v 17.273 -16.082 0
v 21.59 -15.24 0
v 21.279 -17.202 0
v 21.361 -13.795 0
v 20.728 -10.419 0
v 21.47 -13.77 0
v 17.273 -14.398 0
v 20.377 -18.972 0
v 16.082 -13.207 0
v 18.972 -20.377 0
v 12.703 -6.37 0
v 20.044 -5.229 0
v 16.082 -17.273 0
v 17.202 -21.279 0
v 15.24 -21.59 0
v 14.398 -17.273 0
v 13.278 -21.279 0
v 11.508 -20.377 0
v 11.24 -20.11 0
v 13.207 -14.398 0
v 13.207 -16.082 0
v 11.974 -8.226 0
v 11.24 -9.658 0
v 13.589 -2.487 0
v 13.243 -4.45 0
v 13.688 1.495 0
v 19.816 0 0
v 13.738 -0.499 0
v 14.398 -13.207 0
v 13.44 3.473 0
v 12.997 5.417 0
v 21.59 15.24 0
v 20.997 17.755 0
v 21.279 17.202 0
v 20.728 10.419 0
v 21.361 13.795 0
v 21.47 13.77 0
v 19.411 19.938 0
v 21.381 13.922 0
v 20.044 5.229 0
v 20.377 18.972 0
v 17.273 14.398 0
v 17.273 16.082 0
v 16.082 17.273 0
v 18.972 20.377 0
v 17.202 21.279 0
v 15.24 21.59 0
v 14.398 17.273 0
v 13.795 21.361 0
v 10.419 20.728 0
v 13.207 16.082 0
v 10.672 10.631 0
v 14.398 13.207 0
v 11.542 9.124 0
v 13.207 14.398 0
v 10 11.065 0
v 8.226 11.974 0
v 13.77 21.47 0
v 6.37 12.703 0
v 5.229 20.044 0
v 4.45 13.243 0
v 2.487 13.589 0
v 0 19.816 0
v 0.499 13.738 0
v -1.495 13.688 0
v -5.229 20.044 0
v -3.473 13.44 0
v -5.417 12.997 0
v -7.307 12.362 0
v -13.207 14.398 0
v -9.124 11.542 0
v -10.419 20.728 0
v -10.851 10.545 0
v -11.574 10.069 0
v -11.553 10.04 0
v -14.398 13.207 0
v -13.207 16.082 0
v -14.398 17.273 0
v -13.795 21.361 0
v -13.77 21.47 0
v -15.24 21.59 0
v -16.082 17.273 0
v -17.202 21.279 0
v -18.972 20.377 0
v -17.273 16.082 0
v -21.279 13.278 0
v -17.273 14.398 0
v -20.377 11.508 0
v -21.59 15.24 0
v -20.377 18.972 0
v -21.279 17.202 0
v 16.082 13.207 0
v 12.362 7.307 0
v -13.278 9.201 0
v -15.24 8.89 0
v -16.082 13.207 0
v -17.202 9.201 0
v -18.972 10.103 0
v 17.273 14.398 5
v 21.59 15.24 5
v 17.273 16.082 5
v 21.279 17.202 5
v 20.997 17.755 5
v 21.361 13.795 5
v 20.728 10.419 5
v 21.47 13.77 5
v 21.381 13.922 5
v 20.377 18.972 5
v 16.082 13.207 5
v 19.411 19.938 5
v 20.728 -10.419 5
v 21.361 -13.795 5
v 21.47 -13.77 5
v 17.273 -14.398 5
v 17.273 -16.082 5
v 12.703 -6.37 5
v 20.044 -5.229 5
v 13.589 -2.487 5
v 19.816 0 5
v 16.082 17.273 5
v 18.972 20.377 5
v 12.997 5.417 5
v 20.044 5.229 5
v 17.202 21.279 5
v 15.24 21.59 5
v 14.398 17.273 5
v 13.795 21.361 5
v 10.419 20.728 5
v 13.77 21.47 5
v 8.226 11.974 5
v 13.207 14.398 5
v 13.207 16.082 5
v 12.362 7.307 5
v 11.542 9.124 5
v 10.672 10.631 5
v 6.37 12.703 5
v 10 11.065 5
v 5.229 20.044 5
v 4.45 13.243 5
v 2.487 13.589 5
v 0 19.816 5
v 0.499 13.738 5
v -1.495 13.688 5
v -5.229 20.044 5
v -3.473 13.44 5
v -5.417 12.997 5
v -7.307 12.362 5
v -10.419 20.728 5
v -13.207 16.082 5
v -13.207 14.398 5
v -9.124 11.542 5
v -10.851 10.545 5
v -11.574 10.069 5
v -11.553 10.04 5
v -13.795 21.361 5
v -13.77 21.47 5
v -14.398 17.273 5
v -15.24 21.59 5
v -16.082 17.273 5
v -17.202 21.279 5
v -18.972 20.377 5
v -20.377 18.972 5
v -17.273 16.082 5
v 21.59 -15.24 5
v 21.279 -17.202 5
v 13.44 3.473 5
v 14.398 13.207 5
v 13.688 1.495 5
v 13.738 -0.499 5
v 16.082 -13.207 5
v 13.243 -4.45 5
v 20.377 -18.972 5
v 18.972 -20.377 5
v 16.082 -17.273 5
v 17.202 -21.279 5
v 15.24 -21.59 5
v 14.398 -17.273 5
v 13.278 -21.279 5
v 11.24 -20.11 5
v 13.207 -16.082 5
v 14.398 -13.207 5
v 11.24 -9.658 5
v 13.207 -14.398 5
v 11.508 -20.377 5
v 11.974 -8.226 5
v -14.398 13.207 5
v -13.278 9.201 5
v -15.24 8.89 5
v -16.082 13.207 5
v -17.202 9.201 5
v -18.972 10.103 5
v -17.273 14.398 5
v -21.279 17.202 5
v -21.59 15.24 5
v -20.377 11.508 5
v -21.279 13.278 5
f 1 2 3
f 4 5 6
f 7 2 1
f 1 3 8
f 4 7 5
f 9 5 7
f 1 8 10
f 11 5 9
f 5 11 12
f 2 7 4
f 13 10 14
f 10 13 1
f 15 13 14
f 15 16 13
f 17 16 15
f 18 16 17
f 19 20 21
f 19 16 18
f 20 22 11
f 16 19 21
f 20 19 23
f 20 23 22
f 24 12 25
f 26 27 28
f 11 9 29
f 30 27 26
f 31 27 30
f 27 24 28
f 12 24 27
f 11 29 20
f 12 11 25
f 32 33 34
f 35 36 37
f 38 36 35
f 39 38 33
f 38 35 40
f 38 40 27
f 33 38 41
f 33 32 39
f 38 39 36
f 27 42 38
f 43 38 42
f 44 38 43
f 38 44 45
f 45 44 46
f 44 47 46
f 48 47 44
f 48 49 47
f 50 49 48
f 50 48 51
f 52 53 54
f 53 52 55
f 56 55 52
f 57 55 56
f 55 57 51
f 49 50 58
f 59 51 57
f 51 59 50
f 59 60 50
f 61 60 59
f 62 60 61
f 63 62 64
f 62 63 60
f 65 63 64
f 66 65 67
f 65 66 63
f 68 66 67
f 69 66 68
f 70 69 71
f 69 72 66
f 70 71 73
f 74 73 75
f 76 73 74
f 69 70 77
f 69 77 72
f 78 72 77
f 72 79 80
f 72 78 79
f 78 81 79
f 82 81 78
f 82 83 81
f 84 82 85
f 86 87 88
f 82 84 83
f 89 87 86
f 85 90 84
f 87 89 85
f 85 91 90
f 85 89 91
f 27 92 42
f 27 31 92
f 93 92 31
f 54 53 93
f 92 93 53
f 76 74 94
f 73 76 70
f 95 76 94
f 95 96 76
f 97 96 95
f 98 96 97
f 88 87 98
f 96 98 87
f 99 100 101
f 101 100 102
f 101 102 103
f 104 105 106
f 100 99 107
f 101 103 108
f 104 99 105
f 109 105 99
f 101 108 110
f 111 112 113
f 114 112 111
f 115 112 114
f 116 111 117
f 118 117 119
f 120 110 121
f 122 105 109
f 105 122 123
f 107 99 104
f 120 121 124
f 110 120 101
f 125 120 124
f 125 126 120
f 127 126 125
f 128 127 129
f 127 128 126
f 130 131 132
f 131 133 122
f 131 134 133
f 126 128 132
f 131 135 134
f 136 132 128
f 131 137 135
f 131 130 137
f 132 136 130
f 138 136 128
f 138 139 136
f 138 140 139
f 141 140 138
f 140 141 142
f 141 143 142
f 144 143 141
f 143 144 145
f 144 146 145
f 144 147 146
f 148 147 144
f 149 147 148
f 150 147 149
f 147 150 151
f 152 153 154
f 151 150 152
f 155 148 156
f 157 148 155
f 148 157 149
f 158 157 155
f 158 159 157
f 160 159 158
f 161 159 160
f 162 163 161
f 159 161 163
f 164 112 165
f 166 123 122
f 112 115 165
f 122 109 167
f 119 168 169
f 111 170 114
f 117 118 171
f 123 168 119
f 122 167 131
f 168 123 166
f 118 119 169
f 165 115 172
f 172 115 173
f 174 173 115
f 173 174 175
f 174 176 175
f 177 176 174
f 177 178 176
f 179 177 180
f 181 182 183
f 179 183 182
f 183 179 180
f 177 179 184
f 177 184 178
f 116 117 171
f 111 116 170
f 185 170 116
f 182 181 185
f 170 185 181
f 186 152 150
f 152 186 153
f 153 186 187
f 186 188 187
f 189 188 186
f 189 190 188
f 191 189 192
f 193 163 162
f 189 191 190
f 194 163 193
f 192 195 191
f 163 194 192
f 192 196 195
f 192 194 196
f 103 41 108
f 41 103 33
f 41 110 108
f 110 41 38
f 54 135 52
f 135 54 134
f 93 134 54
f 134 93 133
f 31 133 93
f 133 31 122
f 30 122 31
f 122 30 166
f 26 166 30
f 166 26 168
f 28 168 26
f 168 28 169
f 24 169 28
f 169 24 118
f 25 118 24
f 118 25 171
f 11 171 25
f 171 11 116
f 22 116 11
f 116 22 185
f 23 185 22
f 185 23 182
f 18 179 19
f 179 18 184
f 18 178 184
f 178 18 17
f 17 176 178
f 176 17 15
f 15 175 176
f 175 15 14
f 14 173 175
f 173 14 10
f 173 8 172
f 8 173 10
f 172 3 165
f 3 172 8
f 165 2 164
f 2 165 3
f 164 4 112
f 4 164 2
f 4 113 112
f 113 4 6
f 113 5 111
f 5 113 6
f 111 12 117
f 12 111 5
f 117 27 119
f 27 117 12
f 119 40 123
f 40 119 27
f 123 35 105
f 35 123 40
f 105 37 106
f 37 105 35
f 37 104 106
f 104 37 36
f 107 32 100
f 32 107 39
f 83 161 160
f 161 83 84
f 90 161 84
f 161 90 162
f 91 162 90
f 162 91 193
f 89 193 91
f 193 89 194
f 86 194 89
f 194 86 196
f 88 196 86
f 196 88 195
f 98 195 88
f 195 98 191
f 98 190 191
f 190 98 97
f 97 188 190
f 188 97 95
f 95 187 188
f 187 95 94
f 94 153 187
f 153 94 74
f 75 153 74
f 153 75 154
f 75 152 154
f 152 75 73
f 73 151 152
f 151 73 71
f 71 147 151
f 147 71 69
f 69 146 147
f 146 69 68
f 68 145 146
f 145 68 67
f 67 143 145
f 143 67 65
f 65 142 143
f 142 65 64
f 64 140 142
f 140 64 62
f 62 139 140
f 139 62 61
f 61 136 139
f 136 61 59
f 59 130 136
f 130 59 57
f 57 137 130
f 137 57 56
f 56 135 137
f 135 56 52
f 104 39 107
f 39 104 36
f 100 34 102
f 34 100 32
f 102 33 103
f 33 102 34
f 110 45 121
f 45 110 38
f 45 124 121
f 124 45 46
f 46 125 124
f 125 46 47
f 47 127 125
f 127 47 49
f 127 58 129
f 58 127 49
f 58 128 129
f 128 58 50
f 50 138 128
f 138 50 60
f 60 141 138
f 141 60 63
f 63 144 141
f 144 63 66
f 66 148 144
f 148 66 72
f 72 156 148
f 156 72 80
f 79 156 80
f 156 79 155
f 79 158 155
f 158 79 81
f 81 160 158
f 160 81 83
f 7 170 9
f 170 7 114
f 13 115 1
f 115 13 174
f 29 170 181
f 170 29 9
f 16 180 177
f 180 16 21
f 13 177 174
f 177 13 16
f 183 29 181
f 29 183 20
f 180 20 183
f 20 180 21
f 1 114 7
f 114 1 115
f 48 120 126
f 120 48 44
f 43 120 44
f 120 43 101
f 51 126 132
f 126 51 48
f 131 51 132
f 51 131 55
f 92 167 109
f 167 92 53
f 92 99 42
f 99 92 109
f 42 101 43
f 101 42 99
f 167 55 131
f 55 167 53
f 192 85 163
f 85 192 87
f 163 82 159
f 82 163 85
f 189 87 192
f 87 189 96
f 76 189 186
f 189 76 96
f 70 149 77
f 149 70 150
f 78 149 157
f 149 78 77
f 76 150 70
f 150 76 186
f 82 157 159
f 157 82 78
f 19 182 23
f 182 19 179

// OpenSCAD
// file: functions.scad
// PRUSA Mendel  
// Functions used in many files
// GNU GPL v2
// Josef Průša
// josefprusa@me.com
// prusadjs.cz
// http://www.reprap.org/wiki/Prusa_Mendel
// http://github.com/prusajr/PrusaMendel

module nut( d, h, horizontal = true )
{
	cornerdiameter = ( d / 2 ) / cos( 180 / 6 );
	cylinder( h = h, r = cornerdiameter, $fn = 6 );
	if( horizontal )
	{
		for( i = [1 : 6] )
		{
			rotate( [0, 0, 60 * i] ) translate( [-cornerdiameter - 0.2, 0, 0] ) rotate( [0, 0, -45] ) cube( size = [2, 2, h] );
		}
	}
}

// By nophead
module polyhole( d, h ) 
{
	n = max( round( 2 * d ), 3 );
	rotate( [0, 0, 180] ) cylinder( h = h, r = ( d / 2 ) / cos( 180 / n ), $fn = n );
}

module roundcorner( diameter )
{
	difference()
	{
		cube( size = [diameter, diameter, 99], center = false );
		translate( v = [diameter, diameter, 0] ) cylinder( h = 100, r = diameter, center = true );
	}
}
// file: metric.scad
// PRUSA Mendel  
// Default metric sizes
// GNU GPL v2
// Josef Průša
// josefprusa@me.com
// prusadjs.cz
// http://www.reprap.org/wiki/Prusa_Mendel
// http://github.com/prusajr/PrusaMendel

// DONT CHANGE THIS FILE! ALTER VALUES IN CONFIGURATION.SCAD INSTEAD

// RODS

threaded_rod_diameter = 8.2;
threaded_rod_diameter_horizontal = 8.2;
smooth_bar_diameter = 8;
smooth_bar_diameter_horizontal = 8.5;

// Nuts and bolts

m8_diameter = 9;
m8_nut_diameter = 16.4;

m4_diameter = 4.5;
m4_nut_diameter = 9;

m3_diameter = 3.6;
m3_nut_diameter = 6.1;

// Bushing holder

bushing_core_diameter = smooth_bar_diameter;
bushing_material_thickness = 1;

// Motors

motor_shaft = 5.5;
// file: configuration.scad
// PRUSA Mendel  
// Configuration file
// GNU GPL v2
// Josef Průša
// josefprusa@me.com
// prusadjs.cz
// http://www.reprap.org/wiki/Prusa_Mendel
// http://github.com/prusajr/PrusaMendel

// PLEASE SELECT ONE OF THE CONFIGURATIONS BELOW
// BY UN-COMMENTING IT

// Uncomment for metric settings
// METRIC METRIC METRIC METRIC METRIC METRIC METRIC METRIC 

include <metric.scad>;

// Uncomment for imperial settings
// IMPERIAL IMPERIAL IMPERIAL IMPERIAL IMPERIAL IMPERIAL IMPERIAL 

//include <sae.scad>;

// CUSTOM CUSTOM CUSTOM CUSTOM CUSTOM CUSTOM CUSTOM CUSTOM CUSTOM

// Thin walls
layer_height = 0.3;
wot = 1.5;
filament_width = layer_height * wot;

thin_wall = 4 * layer_height * wot;

// LM8UU
linear = true;
linear_bearing_diameter = 15;
linear_bearing_length = 24;

//608 bearing
bearing_diameter = 22;
bearing_thickness = 7;

//Timing belt
belt_pitch = 5;

// CHANGE ONLY THE STUFF YOU KNOW
// IT WILL REPLACE DEFAULT SETTING

// RODS

// threaded_rod_diameter = 0;
// threaded_rod_diameter_horizontal = 0;
// smooth_bar_díameter = 0;
// smooth_bar_díameter_horizontal = 0;

// Nuts and bolts

// m8_diameter = 0;
// m8_nut_diameter = 0;
// m8_nut_thickness = 0;

// m4_diameter = 0;
 m4_nut_diameter = 8.5;
// m4_nut_thickness = 0;

// m3_diameter = 0;
// m3_nut_diameter = 0;
m3_nut_thickness = 3;

// Bushing holder

// bushing_core_diameter = smooth_bar_díameter;
// bushing_material_thickness = 0;

///counted stuff
m3_nut_diameter_bigger = ( ( m3_nut_diameter  / 2) / cos( 180 / 6 ) ) * 2;

// functions 
include <functions.scad>
// main file
// PRUSA Mendel  
// X-end with NEMA 17 motor mount
// GNU GPL v2
// Josef Průša
// josefprusa@me.com
// prusadjs.cz
// http://www.reprap.org/wiki/Prusa_Mendel
// http://github.com/prusajr/PrusaMendel

include <configuration.scad>
corection = 1.17; 

/**
 * @id x-end-motor
 * @name X end motor
 * @category Printed
 * @using 2 bushing
 * @using 4 m3x10xhex
 * @using 4 m3washer
 * @using 1 m8spring
 * @using 2 m8nut
 */


rotate ([0,-90,0])
difference ()
	{
	positioned_motor_mount();
	positioned_motor_mount_holes();
	}


// GregFrosts stuff
nema17_hole_spacing=1.2*25.4; 
nema17_width=1.7*25.4;
thickness=5;
nema17_support_d=nema17_width-nema17_hole_spacing;
motor_mount_rotation=[0,0,0];
motor_mount_translation=[0,0,0];
// motor_mount_translation=[44-thickness,8,23.5-4.7-12+24.5];

top_corner=motor_mount_translation+[thickness,nema17_width/2,nema17_width/2];
bridge_length=top_corner[0]-9;
bridge_shear=0.48;

module positioned_motor_mount()
{
	translate(motor_mount_translation)
	union()
	{
		rotate([0,90,0])
		motor_mount ();
	}
}

module positioned_motor_mount_holes()
{
	translate(motor_mount_translation)
	rotate([0,90,0])
	motor_mount_holes ();
}

module motor_mount ()
{
	rotate(motor_mount_rotation)
	{
		for (hole=[1,2])
		rotate([0,0,90*hole])
		linear_extrude(height=thickness)
		translate(-nema17_hole_spacing*[1,1,0]/2)
		barbell (nema17_support_d/2,
		nema17_support_d/2,20,60,nema17_hole_spacing);
	}
}

module motor_mount_holes ()
{
	// Motor mount holes. 
	translate([0,0,-1])
	rotate(motor_mount_rotation)
	{
		for (hole=[3:5])
		rotate([0,0,90*hole])
		translate(nema17_hole_spacing*[1,1,0]/2)
		rotate(360/16)
		cylinder(h=thickness+2,r=4.4/2,$fn=8);
		
	}
	
	translate([-7/2-0.5-(nema17_width/2-nema17_hole_spacing/2),0,0])
	rotate(270)
	translate([0,0,-1])
	cube([nema17_width/2,nema17_width/2,thickness+2]);
}

module barbell (r1,r2,r3,r4,separation) 
{
	x1=[0,0];
	x2=[separation,0];
	x3=triangulate (x1,x2,r1+r3,r2+r3);
	x4=triangulate (x2,x1,r2+r4,r1+r4);
	# render()
	difference ()
	{
		union()
		{
			translate(x1)
			circle (r=r1);
			translate(x2)
			circle(r=r2);
			polygon (points=[x1,x3,x2,x4]);
		}
		translate(x3)
		circle(r=r3,$fa=5);
		translate(x4)
		circle(r=r4,$fa=5);
	}
}

function triangulate (point1, point2, length1, length2) = 
point1 + 
length1*rotated(
atan2(point2[1]-point1[1],point2[0]-point1[0])+
angle(distance(point1,point2),length1,length2));

function distance(point1,point2)=
sqrt((point1[0]-point2[0])*(point1[0]-point2[0])+
(point1[1]-point2[1])*(point1[1]-point2[1]));

function angle(a,b,c) = acos((a*a+b*b-c*c)/(2*a*b)); 

function rotated(a)=[cos(a),sin(a),0];
